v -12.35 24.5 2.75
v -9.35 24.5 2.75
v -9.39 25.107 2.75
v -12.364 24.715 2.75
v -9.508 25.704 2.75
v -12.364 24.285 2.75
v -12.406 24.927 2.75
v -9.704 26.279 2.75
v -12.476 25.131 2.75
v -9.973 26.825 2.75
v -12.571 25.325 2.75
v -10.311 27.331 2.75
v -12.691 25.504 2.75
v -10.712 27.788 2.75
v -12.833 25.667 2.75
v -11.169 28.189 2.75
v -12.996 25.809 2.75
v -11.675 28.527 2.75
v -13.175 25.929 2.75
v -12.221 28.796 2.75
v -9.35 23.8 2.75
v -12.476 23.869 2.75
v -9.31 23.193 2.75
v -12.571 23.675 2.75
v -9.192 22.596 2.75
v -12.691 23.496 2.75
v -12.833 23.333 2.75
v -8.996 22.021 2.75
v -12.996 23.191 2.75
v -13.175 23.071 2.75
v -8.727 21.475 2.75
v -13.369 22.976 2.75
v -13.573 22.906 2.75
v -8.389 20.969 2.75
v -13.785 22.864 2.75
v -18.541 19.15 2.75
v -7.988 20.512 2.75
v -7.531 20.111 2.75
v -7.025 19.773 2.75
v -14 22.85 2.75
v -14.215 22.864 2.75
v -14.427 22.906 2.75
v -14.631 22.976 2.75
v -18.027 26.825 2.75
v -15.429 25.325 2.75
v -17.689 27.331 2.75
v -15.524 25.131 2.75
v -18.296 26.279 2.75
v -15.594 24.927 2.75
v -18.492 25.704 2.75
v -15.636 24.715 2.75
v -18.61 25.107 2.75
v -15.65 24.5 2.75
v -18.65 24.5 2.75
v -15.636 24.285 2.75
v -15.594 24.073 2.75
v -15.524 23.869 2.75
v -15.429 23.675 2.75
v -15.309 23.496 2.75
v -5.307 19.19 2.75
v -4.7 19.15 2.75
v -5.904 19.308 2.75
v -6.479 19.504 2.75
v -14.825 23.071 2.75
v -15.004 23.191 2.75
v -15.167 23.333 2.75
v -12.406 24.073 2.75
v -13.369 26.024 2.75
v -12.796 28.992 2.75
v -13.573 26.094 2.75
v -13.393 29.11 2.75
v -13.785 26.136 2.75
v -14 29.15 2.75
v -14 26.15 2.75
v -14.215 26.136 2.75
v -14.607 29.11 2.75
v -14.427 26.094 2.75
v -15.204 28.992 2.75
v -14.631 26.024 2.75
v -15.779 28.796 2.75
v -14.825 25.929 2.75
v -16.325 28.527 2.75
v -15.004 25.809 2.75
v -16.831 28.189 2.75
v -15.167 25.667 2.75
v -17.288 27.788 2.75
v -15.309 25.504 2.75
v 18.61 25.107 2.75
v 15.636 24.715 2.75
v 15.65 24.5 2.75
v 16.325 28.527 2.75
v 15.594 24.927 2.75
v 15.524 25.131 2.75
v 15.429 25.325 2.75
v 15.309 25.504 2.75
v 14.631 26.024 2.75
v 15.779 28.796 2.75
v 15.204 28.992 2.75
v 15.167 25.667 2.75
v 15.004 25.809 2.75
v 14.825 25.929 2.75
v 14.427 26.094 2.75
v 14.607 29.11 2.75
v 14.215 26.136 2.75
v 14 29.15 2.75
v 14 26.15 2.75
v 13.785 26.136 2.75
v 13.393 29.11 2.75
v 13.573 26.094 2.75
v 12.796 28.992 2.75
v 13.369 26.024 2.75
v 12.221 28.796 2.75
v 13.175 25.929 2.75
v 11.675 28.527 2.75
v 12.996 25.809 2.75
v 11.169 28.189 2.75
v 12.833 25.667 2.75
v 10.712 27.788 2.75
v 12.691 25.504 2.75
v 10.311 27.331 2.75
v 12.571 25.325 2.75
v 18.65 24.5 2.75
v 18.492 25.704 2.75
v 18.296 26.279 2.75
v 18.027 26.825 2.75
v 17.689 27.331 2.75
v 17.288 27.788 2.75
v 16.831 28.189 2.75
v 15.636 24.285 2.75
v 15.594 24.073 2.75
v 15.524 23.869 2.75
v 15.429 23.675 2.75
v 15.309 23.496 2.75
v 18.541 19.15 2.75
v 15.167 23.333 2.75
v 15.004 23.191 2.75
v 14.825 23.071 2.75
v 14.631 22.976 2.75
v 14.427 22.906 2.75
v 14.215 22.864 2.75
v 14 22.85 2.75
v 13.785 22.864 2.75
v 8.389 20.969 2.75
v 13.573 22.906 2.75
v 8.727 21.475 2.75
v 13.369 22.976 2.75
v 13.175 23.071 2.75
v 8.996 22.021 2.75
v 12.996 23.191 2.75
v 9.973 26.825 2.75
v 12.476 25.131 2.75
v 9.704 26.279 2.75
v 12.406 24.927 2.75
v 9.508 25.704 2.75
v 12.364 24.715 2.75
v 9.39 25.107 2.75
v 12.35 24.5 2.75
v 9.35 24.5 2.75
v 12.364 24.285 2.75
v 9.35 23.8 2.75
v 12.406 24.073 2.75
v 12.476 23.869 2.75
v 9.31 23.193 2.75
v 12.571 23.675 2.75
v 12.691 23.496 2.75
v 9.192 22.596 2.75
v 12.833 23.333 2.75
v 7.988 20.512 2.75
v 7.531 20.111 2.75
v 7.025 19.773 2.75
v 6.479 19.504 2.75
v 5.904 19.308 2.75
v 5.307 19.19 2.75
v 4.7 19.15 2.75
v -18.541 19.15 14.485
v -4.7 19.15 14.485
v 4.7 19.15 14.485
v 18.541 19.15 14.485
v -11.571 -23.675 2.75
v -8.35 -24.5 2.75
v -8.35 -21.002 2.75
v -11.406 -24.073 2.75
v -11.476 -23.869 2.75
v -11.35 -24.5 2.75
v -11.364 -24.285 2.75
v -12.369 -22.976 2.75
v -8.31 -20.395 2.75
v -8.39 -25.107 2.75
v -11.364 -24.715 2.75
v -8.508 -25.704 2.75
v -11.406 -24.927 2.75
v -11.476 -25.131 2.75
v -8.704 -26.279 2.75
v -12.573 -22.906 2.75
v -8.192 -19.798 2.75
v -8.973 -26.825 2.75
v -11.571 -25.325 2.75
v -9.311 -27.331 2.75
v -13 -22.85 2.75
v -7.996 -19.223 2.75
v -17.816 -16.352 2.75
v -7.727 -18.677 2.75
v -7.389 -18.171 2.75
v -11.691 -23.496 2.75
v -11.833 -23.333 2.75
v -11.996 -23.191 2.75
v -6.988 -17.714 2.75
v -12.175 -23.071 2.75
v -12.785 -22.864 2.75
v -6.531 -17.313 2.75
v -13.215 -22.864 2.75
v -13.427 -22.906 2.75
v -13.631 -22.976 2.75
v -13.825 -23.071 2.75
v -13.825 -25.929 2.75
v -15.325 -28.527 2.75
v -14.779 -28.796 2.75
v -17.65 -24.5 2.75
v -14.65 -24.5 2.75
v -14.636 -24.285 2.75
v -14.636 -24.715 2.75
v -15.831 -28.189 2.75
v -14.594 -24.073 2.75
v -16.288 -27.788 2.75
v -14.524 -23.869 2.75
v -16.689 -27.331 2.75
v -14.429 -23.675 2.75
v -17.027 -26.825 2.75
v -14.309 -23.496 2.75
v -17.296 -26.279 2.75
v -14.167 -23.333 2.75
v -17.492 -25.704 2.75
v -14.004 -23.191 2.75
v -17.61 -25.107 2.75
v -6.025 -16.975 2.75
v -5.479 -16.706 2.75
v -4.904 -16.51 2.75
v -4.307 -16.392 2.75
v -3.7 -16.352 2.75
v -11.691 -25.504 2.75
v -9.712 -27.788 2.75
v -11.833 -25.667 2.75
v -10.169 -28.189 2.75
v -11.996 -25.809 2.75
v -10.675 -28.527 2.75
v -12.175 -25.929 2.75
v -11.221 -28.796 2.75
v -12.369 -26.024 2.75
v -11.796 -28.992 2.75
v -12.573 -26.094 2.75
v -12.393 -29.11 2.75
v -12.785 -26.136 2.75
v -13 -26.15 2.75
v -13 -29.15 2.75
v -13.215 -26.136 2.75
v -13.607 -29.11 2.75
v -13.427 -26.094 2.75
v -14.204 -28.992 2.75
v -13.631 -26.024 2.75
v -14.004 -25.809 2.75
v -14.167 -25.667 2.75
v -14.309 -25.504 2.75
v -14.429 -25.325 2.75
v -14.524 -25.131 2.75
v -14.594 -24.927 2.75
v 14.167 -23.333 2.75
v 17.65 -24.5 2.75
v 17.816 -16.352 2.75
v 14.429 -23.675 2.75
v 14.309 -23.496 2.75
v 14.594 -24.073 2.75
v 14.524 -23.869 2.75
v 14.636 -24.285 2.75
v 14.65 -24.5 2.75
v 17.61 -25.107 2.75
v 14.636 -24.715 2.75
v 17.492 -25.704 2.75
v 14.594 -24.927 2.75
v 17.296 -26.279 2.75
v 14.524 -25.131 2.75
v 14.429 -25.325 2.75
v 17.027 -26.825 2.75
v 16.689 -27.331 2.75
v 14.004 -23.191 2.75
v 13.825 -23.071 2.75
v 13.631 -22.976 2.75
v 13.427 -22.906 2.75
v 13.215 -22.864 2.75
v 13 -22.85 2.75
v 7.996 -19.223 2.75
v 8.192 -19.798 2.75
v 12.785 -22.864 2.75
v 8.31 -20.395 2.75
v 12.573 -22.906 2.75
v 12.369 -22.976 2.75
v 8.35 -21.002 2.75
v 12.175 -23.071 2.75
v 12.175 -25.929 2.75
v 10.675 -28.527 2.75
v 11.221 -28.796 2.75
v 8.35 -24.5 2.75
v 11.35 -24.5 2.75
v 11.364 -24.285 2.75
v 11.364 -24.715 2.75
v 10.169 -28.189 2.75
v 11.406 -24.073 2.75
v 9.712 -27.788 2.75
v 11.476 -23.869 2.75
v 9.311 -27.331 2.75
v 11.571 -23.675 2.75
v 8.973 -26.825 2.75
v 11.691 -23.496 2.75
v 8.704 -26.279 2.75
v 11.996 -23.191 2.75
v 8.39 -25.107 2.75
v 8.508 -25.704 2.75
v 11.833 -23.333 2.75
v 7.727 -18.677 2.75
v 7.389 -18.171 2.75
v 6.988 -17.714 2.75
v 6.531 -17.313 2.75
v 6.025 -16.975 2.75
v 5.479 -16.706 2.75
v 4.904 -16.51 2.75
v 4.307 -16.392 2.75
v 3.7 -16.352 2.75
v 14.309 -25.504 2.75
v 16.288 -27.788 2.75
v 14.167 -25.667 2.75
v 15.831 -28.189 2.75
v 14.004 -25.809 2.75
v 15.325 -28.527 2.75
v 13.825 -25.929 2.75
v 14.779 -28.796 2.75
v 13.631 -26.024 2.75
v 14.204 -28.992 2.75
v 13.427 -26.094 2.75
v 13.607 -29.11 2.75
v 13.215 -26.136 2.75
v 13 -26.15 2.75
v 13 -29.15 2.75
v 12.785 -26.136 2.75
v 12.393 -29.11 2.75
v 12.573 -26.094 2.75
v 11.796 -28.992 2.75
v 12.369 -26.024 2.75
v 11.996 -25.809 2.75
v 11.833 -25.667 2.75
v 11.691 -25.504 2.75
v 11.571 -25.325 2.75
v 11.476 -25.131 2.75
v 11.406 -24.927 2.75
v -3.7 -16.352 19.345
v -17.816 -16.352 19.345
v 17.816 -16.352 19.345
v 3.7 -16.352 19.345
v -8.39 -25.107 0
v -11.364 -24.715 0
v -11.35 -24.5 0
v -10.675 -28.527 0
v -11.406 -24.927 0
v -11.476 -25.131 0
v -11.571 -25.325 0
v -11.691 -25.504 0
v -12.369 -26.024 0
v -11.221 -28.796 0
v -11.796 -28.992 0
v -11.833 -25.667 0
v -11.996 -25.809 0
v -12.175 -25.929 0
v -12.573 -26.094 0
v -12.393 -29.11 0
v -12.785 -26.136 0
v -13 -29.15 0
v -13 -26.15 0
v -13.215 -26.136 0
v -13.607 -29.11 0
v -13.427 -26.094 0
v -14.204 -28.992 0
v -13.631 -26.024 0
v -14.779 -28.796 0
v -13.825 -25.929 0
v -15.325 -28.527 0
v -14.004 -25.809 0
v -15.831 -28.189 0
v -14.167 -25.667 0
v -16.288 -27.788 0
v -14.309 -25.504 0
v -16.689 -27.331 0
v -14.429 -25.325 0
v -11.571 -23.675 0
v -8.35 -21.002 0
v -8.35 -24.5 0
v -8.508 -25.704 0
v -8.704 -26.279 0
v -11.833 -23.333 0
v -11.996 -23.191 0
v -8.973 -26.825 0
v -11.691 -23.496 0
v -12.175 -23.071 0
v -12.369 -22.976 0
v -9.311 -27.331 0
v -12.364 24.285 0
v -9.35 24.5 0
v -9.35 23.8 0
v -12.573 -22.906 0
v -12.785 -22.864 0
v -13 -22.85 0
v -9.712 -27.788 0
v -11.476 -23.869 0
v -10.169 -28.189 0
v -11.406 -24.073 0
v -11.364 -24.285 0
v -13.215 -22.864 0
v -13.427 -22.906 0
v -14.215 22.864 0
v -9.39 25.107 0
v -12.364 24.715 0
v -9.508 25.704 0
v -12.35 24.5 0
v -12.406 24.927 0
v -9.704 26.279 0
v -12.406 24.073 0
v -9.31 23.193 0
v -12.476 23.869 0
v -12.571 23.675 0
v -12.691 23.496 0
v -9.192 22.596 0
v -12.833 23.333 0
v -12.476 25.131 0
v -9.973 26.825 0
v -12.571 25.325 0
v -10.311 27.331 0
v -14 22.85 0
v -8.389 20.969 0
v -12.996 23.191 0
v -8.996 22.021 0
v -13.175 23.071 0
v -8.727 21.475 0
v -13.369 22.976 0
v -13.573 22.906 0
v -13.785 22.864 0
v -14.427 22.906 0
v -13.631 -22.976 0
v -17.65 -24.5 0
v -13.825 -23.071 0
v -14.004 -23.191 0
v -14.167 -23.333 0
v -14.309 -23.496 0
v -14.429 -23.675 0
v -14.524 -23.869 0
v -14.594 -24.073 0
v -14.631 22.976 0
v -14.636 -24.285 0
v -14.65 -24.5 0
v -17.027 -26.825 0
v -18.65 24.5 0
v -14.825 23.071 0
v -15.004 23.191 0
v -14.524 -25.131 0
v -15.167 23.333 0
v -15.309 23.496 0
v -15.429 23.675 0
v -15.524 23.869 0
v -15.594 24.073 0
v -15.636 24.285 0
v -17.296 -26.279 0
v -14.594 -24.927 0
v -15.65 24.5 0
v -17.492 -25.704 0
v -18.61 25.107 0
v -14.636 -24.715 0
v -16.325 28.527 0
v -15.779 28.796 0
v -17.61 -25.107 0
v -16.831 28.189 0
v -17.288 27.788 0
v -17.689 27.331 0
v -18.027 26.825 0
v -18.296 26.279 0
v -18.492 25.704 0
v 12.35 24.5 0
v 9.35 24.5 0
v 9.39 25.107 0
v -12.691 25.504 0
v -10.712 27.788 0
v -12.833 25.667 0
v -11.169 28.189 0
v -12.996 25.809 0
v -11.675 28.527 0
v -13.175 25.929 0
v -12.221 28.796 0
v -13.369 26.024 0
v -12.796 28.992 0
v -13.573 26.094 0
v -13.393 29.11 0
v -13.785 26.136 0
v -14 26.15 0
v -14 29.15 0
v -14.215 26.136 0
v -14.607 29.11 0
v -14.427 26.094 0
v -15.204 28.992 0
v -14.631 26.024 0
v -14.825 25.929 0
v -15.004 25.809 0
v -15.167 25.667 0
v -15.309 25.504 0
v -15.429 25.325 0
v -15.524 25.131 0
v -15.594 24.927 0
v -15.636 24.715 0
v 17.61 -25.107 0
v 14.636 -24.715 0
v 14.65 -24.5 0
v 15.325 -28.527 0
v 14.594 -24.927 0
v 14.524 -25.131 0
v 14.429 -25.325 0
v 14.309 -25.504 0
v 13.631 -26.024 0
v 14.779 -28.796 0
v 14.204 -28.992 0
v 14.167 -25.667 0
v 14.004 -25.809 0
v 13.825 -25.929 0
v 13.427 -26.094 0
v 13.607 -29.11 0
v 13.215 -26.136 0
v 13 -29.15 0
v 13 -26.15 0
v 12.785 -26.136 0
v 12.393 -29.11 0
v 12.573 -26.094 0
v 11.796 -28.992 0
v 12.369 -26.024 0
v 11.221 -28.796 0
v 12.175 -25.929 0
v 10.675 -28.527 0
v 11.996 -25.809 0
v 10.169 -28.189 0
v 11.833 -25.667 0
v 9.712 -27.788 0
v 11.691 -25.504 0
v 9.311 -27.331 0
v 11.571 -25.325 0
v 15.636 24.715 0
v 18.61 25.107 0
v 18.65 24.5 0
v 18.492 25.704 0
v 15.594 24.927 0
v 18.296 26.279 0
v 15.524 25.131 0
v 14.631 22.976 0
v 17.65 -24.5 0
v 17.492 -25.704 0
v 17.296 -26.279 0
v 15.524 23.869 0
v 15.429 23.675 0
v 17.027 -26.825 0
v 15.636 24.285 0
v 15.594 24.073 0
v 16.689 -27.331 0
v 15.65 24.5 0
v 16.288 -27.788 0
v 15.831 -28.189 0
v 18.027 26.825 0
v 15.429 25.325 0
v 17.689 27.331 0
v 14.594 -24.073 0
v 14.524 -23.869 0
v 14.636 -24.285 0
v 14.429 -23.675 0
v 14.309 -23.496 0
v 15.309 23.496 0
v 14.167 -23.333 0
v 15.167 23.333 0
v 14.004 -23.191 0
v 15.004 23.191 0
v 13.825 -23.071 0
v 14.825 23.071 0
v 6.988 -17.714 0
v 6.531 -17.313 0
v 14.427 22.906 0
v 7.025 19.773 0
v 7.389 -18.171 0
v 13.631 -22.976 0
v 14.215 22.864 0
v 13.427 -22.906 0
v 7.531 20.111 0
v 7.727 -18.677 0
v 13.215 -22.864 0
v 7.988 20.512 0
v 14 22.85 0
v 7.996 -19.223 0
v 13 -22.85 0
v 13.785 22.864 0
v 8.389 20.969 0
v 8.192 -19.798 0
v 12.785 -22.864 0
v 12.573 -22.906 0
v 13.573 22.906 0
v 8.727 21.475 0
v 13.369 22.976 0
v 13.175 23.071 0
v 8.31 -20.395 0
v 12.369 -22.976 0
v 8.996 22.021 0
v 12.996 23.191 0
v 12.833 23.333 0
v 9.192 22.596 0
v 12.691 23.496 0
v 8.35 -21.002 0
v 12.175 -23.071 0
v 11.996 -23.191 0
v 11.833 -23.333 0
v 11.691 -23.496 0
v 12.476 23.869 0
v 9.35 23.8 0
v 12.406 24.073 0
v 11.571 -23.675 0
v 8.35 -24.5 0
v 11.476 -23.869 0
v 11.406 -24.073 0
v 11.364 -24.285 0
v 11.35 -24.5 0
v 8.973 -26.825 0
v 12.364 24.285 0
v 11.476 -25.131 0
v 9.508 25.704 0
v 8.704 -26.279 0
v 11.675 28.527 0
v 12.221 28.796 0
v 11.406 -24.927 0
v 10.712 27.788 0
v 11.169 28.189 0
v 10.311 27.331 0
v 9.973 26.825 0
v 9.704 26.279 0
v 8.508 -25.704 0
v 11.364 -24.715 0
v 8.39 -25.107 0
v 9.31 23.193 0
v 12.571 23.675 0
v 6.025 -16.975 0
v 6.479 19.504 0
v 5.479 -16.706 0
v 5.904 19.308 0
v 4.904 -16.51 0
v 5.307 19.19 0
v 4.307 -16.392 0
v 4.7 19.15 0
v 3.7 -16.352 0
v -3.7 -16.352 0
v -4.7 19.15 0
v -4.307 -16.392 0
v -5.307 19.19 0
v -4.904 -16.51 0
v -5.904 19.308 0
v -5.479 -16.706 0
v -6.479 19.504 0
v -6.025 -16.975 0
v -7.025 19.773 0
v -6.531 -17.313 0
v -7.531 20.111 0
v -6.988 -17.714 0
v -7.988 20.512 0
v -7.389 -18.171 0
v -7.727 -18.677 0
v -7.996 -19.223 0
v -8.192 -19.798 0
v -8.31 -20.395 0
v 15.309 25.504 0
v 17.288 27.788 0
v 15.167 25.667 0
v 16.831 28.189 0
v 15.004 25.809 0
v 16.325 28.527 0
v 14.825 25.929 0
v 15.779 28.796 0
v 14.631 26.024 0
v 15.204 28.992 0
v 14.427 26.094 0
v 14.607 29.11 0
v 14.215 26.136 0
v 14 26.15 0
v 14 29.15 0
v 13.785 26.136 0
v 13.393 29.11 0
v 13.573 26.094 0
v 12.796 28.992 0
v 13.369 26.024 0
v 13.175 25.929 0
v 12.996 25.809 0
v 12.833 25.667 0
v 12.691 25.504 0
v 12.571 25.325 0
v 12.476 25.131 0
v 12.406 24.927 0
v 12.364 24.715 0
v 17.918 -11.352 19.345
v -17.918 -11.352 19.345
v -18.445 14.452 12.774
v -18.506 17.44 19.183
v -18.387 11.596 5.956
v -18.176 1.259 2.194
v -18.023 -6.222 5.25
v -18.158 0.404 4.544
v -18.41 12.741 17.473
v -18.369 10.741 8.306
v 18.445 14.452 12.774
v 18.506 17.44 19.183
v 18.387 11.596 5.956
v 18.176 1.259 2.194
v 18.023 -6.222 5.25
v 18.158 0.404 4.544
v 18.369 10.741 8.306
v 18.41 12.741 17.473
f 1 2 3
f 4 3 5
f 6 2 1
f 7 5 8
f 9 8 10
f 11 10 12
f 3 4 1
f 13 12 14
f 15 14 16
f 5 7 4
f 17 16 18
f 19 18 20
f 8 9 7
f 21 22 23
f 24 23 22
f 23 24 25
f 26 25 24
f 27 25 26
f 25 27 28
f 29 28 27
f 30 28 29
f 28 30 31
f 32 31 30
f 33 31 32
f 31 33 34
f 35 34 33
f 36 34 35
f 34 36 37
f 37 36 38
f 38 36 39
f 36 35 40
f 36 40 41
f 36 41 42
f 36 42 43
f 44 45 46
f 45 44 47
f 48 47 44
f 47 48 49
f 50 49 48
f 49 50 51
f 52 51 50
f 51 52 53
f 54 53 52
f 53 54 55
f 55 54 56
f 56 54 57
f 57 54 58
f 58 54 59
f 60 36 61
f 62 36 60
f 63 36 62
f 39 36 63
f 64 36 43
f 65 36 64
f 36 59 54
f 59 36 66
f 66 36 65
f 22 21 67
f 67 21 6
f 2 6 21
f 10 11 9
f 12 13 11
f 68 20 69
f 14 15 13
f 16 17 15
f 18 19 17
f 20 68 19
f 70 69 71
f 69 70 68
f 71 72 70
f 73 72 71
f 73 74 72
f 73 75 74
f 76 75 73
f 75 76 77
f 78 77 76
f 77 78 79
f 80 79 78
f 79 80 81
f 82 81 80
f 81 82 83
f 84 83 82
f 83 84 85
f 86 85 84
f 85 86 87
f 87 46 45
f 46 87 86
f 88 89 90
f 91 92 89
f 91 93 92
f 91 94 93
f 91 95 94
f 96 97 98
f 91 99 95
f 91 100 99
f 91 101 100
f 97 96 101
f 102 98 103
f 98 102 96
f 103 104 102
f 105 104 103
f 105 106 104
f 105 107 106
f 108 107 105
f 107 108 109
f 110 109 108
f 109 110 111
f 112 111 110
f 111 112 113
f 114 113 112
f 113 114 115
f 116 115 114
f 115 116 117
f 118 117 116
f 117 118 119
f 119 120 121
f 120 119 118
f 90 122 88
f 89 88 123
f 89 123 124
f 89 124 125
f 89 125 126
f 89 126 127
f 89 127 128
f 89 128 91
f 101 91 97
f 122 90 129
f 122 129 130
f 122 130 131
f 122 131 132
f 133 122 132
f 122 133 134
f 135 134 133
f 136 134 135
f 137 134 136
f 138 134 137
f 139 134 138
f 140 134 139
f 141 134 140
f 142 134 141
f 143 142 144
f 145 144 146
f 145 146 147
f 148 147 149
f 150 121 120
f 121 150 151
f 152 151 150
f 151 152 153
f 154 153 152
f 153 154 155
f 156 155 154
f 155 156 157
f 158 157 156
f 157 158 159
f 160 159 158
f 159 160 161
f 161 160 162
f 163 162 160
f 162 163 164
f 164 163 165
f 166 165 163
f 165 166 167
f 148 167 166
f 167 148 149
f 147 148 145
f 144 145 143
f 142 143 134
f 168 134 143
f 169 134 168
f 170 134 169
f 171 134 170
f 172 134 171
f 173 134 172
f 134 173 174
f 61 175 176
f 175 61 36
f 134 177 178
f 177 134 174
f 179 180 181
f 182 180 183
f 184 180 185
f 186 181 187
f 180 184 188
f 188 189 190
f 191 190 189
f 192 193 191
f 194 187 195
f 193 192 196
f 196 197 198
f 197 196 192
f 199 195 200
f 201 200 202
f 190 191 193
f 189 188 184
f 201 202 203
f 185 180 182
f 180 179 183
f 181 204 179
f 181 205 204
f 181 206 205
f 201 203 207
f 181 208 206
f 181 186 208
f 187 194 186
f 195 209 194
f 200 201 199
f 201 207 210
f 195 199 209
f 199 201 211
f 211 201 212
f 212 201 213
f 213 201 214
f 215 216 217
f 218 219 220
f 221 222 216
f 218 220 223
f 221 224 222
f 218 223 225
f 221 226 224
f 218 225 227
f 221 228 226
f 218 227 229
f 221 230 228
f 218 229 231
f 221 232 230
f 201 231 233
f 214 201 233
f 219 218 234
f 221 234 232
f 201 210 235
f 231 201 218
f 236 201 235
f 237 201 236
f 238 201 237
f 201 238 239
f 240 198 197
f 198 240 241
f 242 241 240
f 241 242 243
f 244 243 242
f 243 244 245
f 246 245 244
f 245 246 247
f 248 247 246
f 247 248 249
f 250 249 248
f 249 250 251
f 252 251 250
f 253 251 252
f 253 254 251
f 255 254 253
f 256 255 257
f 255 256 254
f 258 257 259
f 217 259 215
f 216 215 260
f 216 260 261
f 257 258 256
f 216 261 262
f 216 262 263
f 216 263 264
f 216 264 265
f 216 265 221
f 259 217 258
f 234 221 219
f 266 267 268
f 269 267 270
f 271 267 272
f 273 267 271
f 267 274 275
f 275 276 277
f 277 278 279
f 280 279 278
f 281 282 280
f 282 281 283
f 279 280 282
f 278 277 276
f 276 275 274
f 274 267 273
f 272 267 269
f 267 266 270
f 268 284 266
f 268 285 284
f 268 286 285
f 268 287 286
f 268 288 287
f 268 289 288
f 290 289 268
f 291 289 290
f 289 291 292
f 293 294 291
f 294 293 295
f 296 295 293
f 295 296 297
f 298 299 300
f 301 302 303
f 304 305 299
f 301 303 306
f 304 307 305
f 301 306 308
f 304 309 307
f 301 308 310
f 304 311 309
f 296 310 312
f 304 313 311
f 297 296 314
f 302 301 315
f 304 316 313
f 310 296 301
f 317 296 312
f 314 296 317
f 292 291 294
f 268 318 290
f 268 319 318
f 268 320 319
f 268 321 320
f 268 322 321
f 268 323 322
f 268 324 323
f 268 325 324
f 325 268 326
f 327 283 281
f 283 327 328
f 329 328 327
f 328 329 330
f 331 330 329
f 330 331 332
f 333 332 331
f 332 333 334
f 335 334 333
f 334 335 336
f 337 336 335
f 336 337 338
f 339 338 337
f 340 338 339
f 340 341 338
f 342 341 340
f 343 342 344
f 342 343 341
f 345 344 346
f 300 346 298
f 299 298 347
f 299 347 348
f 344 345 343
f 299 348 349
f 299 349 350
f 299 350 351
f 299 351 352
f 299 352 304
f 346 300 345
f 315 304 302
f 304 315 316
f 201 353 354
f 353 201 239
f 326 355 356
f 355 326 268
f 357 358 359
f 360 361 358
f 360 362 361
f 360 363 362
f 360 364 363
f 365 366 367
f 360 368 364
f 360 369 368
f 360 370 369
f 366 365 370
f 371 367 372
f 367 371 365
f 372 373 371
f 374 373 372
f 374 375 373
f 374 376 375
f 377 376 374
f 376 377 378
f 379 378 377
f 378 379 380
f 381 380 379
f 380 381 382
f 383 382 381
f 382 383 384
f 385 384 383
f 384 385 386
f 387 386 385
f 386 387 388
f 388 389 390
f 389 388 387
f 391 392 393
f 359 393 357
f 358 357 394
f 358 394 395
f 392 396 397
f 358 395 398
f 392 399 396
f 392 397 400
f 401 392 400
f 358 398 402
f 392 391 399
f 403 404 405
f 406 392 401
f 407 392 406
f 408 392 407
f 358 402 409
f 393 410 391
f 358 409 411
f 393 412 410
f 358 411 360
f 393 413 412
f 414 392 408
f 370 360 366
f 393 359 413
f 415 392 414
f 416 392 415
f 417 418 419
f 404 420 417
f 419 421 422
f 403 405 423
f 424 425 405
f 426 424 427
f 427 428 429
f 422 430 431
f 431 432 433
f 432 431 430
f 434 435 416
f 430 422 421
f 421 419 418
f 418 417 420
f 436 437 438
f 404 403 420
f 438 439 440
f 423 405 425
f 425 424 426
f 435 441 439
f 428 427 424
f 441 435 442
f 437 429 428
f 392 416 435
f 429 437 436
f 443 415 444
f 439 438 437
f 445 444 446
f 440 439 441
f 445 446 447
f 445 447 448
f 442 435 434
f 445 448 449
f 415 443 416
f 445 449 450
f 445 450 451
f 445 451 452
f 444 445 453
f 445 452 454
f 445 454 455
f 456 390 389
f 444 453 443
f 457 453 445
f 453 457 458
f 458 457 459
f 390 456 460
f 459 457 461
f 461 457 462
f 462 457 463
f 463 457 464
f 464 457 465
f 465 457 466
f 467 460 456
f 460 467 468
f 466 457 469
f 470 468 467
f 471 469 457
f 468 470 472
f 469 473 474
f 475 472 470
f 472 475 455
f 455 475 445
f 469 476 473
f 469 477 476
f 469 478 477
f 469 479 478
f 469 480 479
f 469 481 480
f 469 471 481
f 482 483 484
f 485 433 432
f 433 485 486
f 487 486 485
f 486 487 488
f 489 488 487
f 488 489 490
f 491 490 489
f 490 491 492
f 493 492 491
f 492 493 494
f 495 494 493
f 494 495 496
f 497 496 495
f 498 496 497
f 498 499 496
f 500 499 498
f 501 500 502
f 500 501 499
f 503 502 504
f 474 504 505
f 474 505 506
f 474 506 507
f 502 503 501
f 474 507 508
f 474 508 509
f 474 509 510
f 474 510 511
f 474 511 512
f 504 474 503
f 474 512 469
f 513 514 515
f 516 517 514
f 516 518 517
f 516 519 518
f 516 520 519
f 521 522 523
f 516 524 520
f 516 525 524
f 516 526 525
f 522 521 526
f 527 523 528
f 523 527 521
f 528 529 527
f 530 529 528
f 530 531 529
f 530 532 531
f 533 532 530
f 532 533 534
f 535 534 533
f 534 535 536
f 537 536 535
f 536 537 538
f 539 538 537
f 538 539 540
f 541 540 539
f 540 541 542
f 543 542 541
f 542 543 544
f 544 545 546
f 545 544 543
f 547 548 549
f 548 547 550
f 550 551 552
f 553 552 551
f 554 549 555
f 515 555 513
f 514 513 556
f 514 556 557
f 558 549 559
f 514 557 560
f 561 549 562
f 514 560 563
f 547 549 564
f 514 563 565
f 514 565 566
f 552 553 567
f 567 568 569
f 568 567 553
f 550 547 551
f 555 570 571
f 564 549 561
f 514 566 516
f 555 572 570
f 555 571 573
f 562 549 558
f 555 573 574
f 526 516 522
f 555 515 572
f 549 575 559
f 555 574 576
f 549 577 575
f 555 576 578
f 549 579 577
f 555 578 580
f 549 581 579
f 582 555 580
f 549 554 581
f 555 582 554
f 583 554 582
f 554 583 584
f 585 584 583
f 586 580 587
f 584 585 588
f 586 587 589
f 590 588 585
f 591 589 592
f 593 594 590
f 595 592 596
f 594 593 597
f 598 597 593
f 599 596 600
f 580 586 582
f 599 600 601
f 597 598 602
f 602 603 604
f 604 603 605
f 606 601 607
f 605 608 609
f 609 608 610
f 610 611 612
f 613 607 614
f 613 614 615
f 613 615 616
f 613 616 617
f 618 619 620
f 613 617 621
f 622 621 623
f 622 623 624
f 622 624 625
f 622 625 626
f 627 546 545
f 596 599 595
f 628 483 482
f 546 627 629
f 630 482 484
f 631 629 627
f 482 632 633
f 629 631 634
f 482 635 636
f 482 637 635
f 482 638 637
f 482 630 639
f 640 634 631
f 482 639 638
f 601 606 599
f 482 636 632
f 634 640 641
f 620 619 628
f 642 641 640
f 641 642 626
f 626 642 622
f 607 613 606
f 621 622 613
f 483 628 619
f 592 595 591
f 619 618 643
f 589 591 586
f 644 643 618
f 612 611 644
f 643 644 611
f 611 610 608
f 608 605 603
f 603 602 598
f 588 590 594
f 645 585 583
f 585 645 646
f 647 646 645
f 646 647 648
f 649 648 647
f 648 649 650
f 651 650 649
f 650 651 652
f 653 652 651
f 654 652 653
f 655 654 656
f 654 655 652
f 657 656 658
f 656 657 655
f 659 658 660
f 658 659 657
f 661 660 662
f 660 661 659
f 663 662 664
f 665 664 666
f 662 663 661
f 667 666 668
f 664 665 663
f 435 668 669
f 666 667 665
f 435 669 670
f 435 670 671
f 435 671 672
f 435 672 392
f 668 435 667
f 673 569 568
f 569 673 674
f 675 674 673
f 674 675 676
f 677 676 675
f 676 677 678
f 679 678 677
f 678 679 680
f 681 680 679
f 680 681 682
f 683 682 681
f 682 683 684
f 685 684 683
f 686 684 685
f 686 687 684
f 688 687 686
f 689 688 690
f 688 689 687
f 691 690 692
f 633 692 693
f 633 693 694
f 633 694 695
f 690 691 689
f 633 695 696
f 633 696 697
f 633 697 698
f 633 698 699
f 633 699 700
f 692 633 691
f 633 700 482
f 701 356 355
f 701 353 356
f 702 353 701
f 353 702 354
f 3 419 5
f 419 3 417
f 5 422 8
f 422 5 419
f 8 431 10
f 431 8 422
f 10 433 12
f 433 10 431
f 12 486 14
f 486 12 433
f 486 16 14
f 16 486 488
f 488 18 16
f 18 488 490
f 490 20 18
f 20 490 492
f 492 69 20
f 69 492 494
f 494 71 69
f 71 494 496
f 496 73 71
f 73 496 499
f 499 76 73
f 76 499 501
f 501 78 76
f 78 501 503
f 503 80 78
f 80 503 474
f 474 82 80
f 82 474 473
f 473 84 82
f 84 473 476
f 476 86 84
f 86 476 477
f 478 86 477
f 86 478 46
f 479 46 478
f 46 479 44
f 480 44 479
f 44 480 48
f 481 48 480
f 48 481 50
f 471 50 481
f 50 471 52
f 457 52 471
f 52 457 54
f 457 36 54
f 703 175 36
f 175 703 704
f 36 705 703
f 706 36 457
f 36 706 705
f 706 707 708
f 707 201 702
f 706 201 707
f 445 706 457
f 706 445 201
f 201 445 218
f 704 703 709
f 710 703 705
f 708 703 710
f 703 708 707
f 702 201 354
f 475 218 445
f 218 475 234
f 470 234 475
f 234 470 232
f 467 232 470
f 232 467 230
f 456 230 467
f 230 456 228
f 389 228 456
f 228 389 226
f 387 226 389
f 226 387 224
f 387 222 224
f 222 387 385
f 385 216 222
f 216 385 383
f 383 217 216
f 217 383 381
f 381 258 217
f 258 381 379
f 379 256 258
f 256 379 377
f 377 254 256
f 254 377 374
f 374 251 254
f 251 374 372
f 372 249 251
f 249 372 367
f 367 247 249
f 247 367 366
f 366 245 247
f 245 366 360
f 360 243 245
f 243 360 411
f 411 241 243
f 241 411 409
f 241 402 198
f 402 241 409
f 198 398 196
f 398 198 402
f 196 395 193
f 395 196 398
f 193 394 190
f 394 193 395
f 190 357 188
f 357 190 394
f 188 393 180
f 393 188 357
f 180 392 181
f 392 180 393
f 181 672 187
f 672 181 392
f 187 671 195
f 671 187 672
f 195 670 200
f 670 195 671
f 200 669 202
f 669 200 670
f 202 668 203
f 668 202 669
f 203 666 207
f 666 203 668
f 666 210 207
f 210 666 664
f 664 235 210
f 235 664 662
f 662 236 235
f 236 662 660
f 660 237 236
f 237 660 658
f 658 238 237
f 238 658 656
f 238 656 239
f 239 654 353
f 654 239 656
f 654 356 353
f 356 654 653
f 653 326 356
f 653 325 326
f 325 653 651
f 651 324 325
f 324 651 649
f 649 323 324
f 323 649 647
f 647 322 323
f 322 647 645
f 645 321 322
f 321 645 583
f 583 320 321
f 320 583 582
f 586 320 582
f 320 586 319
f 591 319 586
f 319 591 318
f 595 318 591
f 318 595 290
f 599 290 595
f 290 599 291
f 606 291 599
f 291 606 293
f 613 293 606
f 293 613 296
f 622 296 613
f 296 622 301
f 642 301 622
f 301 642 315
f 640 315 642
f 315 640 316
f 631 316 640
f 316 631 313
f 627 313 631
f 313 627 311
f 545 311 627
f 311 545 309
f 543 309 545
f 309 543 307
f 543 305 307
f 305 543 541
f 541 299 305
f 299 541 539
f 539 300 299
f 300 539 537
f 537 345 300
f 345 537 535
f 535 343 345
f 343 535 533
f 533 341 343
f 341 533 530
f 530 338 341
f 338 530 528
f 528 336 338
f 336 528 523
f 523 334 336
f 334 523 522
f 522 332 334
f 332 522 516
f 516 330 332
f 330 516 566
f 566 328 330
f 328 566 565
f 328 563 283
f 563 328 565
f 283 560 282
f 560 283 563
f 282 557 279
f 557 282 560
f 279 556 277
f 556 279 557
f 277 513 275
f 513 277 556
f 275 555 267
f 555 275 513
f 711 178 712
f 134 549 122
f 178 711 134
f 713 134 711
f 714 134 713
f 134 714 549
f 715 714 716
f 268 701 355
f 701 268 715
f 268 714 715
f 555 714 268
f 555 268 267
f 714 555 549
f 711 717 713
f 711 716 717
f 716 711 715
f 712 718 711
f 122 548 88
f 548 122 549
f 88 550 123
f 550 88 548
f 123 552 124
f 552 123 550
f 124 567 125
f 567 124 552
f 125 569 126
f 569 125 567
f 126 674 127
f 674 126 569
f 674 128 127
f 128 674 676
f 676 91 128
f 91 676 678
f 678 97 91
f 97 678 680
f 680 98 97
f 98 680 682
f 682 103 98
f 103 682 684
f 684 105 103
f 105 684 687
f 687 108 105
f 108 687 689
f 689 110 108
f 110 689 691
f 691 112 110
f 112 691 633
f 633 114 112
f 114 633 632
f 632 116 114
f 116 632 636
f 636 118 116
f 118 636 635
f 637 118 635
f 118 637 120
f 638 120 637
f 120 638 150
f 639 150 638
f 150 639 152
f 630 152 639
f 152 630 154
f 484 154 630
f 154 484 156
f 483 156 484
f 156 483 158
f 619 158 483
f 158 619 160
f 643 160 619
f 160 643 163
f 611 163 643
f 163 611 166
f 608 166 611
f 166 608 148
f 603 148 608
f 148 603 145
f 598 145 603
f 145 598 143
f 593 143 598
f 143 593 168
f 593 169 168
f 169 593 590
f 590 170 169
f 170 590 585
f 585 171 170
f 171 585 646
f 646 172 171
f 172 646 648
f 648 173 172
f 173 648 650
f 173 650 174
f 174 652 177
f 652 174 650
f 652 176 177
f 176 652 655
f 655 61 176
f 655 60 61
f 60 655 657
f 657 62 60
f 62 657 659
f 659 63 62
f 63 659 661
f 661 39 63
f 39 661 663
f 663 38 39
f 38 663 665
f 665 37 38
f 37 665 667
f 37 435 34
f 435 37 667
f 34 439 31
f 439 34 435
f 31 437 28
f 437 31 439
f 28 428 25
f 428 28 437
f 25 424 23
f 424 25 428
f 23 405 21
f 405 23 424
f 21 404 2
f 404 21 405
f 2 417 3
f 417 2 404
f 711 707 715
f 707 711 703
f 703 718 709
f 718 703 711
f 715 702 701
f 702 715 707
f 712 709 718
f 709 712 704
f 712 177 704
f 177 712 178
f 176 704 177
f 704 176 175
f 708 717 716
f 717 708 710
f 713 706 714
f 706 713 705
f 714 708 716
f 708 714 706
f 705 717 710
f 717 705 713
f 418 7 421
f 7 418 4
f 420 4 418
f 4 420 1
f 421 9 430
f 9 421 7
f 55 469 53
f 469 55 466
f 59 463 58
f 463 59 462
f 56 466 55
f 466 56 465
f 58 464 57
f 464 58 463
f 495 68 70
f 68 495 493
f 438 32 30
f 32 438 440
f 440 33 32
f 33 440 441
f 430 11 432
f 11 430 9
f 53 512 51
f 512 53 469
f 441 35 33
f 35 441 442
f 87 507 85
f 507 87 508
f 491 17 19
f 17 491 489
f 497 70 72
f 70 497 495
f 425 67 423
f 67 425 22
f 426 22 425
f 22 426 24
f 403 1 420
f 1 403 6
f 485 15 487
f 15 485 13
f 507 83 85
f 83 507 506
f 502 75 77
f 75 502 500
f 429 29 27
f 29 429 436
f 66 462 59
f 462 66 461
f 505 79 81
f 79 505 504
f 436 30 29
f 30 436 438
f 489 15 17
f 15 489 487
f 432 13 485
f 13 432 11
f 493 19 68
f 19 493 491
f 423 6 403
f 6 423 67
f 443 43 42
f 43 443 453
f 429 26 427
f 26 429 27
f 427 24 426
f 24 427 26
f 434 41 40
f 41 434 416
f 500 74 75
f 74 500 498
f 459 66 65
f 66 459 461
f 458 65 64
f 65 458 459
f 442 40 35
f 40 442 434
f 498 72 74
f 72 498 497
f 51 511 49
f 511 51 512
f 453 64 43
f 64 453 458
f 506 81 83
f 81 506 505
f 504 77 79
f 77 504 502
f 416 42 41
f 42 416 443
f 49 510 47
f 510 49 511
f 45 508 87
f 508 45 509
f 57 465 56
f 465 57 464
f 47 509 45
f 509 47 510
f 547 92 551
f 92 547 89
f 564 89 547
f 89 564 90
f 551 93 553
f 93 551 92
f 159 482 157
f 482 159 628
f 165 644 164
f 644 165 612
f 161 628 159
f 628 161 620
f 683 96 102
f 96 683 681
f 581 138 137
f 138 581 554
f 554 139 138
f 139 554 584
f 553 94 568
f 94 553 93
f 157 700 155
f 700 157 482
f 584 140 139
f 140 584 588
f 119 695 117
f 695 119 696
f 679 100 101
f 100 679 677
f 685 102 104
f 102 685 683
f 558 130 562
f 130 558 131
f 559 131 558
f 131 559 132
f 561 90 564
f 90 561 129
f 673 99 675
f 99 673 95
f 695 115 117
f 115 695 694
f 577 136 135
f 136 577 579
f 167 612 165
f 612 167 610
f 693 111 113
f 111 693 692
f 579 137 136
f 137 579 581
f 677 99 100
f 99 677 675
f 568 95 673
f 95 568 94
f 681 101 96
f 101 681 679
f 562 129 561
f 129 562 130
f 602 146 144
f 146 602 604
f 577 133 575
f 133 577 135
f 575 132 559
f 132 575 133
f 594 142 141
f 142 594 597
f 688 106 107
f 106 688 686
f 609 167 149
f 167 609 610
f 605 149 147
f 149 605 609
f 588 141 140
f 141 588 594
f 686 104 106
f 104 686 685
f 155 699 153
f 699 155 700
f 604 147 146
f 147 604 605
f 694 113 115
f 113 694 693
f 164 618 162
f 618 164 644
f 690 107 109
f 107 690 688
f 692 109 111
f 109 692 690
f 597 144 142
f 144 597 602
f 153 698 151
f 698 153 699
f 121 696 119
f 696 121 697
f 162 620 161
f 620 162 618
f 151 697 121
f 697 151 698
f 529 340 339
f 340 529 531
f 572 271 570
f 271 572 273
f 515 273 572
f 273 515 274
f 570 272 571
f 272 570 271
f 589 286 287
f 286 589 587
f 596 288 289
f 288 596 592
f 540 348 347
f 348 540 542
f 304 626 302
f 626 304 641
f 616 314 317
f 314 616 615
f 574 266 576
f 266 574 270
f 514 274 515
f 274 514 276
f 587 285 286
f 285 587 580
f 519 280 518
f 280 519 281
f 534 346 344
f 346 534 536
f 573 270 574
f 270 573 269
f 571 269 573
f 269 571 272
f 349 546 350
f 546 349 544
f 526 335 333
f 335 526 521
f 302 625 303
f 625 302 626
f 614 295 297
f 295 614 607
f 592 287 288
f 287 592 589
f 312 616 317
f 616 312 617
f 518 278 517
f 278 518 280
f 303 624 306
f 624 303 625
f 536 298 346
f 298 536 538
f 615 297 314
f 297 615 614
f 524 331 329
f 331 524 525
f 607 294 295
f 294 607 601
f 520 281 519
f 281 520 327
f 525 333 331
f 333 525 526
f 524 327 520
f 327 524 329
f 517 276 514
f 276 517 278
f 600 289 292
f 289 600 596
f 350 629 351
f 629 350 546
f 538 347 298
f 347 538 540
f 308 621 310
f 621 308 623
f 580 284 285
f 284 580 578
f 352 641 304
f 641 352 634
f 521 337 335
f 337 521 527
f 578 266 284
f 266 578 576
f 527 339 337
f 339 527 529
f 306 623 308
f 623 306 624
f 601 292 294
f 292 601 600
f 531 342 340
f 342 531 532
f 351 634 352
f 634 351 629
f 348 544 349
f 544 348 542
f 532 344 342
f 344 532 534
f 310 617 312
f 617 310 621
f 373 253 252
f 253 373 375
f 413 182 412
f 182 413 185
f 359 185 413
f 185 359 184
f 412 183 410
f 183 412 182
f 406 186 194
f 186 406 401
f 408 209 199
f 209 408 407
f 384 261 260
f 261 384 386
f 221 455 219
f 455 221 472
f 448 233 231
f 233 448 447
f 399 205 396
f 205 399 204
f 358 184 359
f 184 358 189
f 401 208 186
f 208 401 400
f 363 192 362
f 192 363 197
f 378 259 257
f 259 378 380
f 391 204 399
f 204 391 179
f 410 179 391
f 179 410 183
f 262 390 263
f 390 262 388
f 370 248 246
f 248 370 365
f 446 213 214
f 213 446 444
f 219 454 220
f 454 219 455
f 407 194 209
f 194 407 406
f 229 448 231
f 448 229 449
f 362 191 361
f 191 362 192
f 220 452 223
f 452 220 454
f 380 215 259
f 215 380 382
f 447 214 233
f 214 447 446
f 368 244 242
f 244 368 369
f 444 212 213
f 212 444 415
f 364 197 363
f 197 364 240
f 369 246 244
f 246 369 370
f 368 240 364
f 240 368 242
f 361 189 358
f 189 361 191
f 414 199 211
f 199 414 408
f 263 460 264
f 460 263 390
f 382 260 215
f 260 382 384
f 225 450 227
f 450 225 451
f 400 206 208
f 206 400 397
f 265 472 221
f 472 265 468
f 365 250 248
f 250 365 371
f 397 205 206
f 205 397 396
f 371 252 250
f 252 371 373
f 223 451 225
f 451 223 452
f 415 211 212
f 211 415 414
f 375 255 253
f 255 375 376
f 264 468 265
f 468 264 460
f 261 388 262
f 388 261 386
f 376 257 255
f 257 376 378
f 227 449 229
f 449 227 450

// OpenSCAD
//Depth of camera
camera_depth = 22;
//Height of the supporting back
back_height = 15;
//C/C Distance between front holes
front_cc = 28;
//C/C Distance between rear holes
rear_cc = 26;
//C/C Distance between front and rear holes
front_rear_cc = 49;
//angle of camera
angle = 20; //[10:45]
//Thickness of the base
base_thickness = 2.75;
//Hole diameter (may need adjustment depending on printer)
hole_size = 3.3;
//Determines the amount of "meat" around the holes
edge_margin = 3;
//Diameter of screw head (to allow enough clerance)
screw_head_size = 6.1;
//Wedge offset from front
front_offset = 10;
//Add lip to fron of wedge
use_lip = "Yes"; //[Yes,No]
//Velcro strap width
velcro_width = 11;
//Velcro strap thickness
velcro_thickness = 2.5;
//antenna holder angle
angle2 = 85;
antDist = 7;


//Calculated variables wont be visible to Thingiverse customizer
hole_clearence = edge_margin+hole_size/2;
screw_head_clerance = screw_head_size / 2;
hole_radius = hole_size / 2;
lip_thickness = use_lip == "Yes" ? 5*1 : 0*1;
lip_height =  use_lip == "Yes" ? 5*1 : 0*1;

//internal global varaibles
_xFrontOffset = front_cc/2;
_xRearOffset = rear_cc/2;
_xTotFrontOffset = front_cc/2+hole_clearence;
_xTotRearOffset = rear_cc/2+hole_clearence;
_yOffset = front_rear_cc/2;
_yTotOffset = front_rear_cc/2+hole_clearence;
_cameraHolderDepth = (lip_thickness+camera_depth)*cos(angle)+back_height*sin(angle)+lip_thickness;
_cameraHolderHeight = back_height*cos(angle) + base_thickness + velcro_thickness;
_wedgeStartYoffset = _yTotOffset - front_offset;
_wedgeEndYoffset = _yTotOffset - front_offset - _cameraHolderDepth;
_rearSpaceLeft = _yTotOffset * 2 - front_offset - _cameraHolderDepth;
_totWidth = front_cc > rear_cc ? front_cc + hole_clearence*2 : rear_cc + hole_clearence*2;
_velcroXpos = (velcro_width + edge_margin) < (front_cc+2*edge_margin+hole_size) / 2 ? 0 :  ((front_cc+2*edge_margin+hole_size) / 2 )-(velcro_width + edge_margin);


/**
 *
 */
module tube(inDia, outDia, height) {
	difference(){
		cylinder(h = height, r = outDia/2, $fn=50);
		translate([0, 0, -0.5]) { cylinder(h = height+1, r = inDia/2, $fn=30); }
	}
}

module createBase()
{   
           
    difference()
    {
        linear_extrude( height = _cameraHolderHeight)
        {
            union()
            {
                if( front_offset > 0 )
                {
                    polygon(
                                points = [  [-_xTotFrontOffset, _yOffset],
                                            [-_xFrontOffset+hole_clearence, _yOffset],
                                            [-_xFrontOffset+hole_clearence, _wedgeStartYoffset],
                                            [_xFrontOffset-hole_clearence, _wedgeStartYoffset],
                                            [_xFrontOffset-hole_clearence, _yOffset],
                                            [_xTotFrontOffset, _yOffset], 
                                            [_xTotRearOffset, -_yOffset], 
                                            [_xRearOffset-hole_clearence, -_yOffset], 
                                            [_xRearOffset-hole_clearence, _wedgeEndYoffset], 
                                            [-_xRearOffset+hole_clearence, _wedgeEndYoffset], 
                                            [-_xRearOffset+hole_clearence, -_yOffset], 
                                            [-_xTotRearOffset, -_yOffset] ], 
                                convexity = 10);
                } else {
                    polygon(
                                points = [  [-_xFrontOffset, _yOffset+hole_clearence],                                        [_xFrontOffset, _yOffset+hole_clearence], 
                                            [_xTotFrontOffset, _yOffset], 
                                            [_xTotRearOffset, -_yOffset], 
                                            [_xRearOffset-hole_clearence, -_yOffset], 
                                            [_xRearOffset-hole_clearence, _wedgeEndYoffset], 
                                            [-_xRearOffset+hole_clearence, _wedgeEndYoffset], 
                                            [-_xRearOffset+hole_clearence, -_yOffset], 
                                            [-_xTotRearOffset, -_yOffset],
                                            [-_xTotFrontOffset, _yOffset]],
                                convexity = 10);
                }
                translate([-_xFrontOffset, _yOffset, 0])
                circle(r=hole_clearence, center = false); 
                translate([_xFrontOffset, _yOffset, 0])
                circle(r=hole_clearence, center = false); 
                translate([_xRearOffset, -_yOffset, 0])
                circle(r=hole_clearence, center = false); 
                translate([-_xRearOffset, -_yOffset, 0])
                circle(r=hole_clearence, center = false); 
                if(front_offset > hole_clearence*2)
                {
                    difference()
                    {
                        union()
                        {
                            translate([_xFrontOffset-hole_clearence*2, _wedgeStartYoffset, 0])
                            square([hole_clearence,hole_clearence]);
                            translate([-_xFrontOffset+hole_clearence, _wedgeStartYoffset, 0])
                            square([hole_clearence,hole_clearence]);
                        }
                        union()
                        {
                            translate([_xFrontOffset-hole_clearence*2, _wedgeStartYoffset+hole_clearence, 0])
                            circle(r=hole_clearence, center = false); 
                            translate([-_xFrontOffset+hole_clearence*2, _wedgeStartYoffset+hole_clearence, 0])                circle(r=hole_clearence, center = false);   
                        }
                    }
                }
                if((_yTotOffset + _wedgeEndYoffset) > hole_clearence*2)
                {
                    difference()
                    {
                        union()
                        {
                            translate([_xRearOffset-hole_clearence*2, _wedgeEndYoffset-hole_clearence, 0])
                            square([hole_clearence,hole_clearence]);
                            translate([-_xRearOffset+hole_clearence, _wedgeEndYoffset-hole_clearence, 0])
                            square([hole_clearence,hole_clearence]);
                            
                        }
                        union()
                        {
                            translate([_xRearOffset-hole_clearence*2, _wedgeEndYoffset-hole_clearence, 0])
                            circle(r=hole_clearence, center = false); 
                            translate([-_xRearOffset+hole_clearence*2, _wedgeEndYoffset-hole_clearence, 0])
                            circle(r=hole_clearence, center = false); 
                        }
                    }
                }
            }
        }
        union()
        {
            translate([-_totWidth/2, _wedgeStartYoffset, base_thickness])
            cube([_totWidth,front_rear_cc,_cameraHolderHeight], center = false);
            rearSpace = _yTotOffset + _wedgeEndYoffset;
            translate([-_totWidth/2, _wedgeEndYoffset-rearSpace, base_thickness])
            cube([_totWidth,rearSpace,_cameraHolderHeight], center = false);
        }
    }    
}

module addWedge()
{
    totWidth = front_cc > rear_cc ? front_cc + edge_margin*2+hole_size: rear_cc + edge_margin*2+hole_size;
                xOffset = totWidth/2;  
    difference()
    {
        difference()
        {
            children();
            union()
            {
                          
                yOffset = (front_rear_cc/2+edge_margin+hole_size/2)-(lip_thickness+camera_depth)*cos(angle) -front_offset;
                translate([-xOffset, yOffset, base_thickness+velcro_thickness])
                rotate([angle,0,0])
                cube([totWidth, camera_depth, back_height+5], center = false);
                
            }
        }
       union()
       {
           yOffset = (front_rear_cc/2+edge_margin+hole_size/2)-lip_thickness*cos(angle) -front_offset; 
                zOffset = base_thickness+velcro_thickness + camera_depth*sin(angle);
                translate([-xOffset, yOffset, zOffset])
                rotate([angle,0,0])
                translate([0, -1, lip_height])
                cube([totWidth, front_rear_cc, back_height+5], center = false);
                translate([-xOffset, yOffset, zOffset])
                rotate([angle,0,0])
                translate([0, lip_thickness, 0])
                cube([totWidth, front_rear_cc, back_height+5], center = false);
       } 
    }
}

module addStrapHole()
{
    difference()
    {
        children();
        union()
        {
            /*
            yOffset = (front_rear_cc/2+edge_margin+hole_size/2)-lip_thickness*cos(angle) -front_offset; 
            zOffset = base_thickness+velcro_thickness + camera_depth*sin(angle);
            translate([0, yOffset, zOffset])
            rotate([angle,0,0])
            translate([_velcroXpos, 0, -zOffset+base_thickness])
            cube([velcro_width, lip_thickness+1, zOffset*2], center = false);
            ySize = camera_depth + base_thickness + velcro_thickness;
            translate([0, yOffset, zOffset])
            rotate([angle,0,0])            
            translate([_velcroXpos, -ySize, -base_thickness-velcro_thickness])
            cube([velcro_width, ySize+1, velcro_thickness], center = false);
            translate([0, yOffset, zOffset])
            rotate([angle,0,0])            
            translate([_velcroXpos, -ySize, -base_thickness-velcro_thickness])            
            cube([velcro_width, velcro_thickness, back_height*1.5], center = false);
            */
            
            translate([0,6,base_thickness+velcro_thickness]){ 
                rotate([angle,0,0]){
                    cube([_totWidth, velcro_width, velcro_thickness], center = true);
                }
            }
            
        }
    }
}

module clearForScrews()
{
    xOffsetFront = front_cc/2;
    xOffsetRear = rear_cc/2;
    yOffset = front_rear_cc/2;
    
    difference()
    {
        children();
        union()
        {
            //Screw holes
            translate([-xOffsetFront, yOffset, (base_thickness+1)/2])
            cylinder(h=base_thickness+1, r=hole_radius, center = true); 
            translate([xOffsetFront, yOffset, (base_thickness+1)/2])
            cylinder(h=base_thickness+1, r=hole_radius, center = true); 
            translate([xOffsetRear, -yOffset, (base_thickness+1)/2])
            cylinder(h=base_thickness+1, r=hole_radius, center = true); 
            translate([-xOffsetRear, -yOffset, (base_thickness+1)/2])
            cylinder(h=base_thickness+1, r=hole_radius, center = true); 
            translate([xOffsetRear, -yOffset, 50+base_thickness])
            cylinder(h=100, r=screw_head_clerance, center = true);        translate([-xOffsetRear, -yOffset, 50+base_thickness])
            cylinder(h=100, r=screw_head_clerance, center = true);
            translate([-xOffsetFront, yOffset, 50+base_thickness])
            cylinder(h=100, r=screw_head_clerance, center = true);
            translate([xOffsetFront, yOffset, 50+base_thickness])
            cylinder(h=100, r=screw_head_clerance, center = true);
            /*
            for(i=[-1,1]){
            translate([i*antDist/2,-front_rear_cc/2-1,0]) rotate([0,i*angle2/2,0]) cylinder(r=hole_size/2, h=90, $fn=20,center=true);
}
            */
        }
    }
}


$fn = 48;
clearForScrews()
{
    addStrapHole()
    {
        addWedge()
        {
            createBase();
        }
    }
}

/**
//antenna holder
difference(){

for(i=[-1,1]){
translate([i*antDist/2,-front_rear_cc/2-1,0]) rotate([0,i*angle2/2,0]) tube(hole_size, 7.5, 15);
}

translate([0,0,-10/2]) cube(size=[100,100,10], center=true);
for(i=[-1,1]){
translate([i*antDist/2, -front_rear_cc/2-1,10/2+8]) cube(size=[27,10,10], center=true);
}

}//diff
**/
